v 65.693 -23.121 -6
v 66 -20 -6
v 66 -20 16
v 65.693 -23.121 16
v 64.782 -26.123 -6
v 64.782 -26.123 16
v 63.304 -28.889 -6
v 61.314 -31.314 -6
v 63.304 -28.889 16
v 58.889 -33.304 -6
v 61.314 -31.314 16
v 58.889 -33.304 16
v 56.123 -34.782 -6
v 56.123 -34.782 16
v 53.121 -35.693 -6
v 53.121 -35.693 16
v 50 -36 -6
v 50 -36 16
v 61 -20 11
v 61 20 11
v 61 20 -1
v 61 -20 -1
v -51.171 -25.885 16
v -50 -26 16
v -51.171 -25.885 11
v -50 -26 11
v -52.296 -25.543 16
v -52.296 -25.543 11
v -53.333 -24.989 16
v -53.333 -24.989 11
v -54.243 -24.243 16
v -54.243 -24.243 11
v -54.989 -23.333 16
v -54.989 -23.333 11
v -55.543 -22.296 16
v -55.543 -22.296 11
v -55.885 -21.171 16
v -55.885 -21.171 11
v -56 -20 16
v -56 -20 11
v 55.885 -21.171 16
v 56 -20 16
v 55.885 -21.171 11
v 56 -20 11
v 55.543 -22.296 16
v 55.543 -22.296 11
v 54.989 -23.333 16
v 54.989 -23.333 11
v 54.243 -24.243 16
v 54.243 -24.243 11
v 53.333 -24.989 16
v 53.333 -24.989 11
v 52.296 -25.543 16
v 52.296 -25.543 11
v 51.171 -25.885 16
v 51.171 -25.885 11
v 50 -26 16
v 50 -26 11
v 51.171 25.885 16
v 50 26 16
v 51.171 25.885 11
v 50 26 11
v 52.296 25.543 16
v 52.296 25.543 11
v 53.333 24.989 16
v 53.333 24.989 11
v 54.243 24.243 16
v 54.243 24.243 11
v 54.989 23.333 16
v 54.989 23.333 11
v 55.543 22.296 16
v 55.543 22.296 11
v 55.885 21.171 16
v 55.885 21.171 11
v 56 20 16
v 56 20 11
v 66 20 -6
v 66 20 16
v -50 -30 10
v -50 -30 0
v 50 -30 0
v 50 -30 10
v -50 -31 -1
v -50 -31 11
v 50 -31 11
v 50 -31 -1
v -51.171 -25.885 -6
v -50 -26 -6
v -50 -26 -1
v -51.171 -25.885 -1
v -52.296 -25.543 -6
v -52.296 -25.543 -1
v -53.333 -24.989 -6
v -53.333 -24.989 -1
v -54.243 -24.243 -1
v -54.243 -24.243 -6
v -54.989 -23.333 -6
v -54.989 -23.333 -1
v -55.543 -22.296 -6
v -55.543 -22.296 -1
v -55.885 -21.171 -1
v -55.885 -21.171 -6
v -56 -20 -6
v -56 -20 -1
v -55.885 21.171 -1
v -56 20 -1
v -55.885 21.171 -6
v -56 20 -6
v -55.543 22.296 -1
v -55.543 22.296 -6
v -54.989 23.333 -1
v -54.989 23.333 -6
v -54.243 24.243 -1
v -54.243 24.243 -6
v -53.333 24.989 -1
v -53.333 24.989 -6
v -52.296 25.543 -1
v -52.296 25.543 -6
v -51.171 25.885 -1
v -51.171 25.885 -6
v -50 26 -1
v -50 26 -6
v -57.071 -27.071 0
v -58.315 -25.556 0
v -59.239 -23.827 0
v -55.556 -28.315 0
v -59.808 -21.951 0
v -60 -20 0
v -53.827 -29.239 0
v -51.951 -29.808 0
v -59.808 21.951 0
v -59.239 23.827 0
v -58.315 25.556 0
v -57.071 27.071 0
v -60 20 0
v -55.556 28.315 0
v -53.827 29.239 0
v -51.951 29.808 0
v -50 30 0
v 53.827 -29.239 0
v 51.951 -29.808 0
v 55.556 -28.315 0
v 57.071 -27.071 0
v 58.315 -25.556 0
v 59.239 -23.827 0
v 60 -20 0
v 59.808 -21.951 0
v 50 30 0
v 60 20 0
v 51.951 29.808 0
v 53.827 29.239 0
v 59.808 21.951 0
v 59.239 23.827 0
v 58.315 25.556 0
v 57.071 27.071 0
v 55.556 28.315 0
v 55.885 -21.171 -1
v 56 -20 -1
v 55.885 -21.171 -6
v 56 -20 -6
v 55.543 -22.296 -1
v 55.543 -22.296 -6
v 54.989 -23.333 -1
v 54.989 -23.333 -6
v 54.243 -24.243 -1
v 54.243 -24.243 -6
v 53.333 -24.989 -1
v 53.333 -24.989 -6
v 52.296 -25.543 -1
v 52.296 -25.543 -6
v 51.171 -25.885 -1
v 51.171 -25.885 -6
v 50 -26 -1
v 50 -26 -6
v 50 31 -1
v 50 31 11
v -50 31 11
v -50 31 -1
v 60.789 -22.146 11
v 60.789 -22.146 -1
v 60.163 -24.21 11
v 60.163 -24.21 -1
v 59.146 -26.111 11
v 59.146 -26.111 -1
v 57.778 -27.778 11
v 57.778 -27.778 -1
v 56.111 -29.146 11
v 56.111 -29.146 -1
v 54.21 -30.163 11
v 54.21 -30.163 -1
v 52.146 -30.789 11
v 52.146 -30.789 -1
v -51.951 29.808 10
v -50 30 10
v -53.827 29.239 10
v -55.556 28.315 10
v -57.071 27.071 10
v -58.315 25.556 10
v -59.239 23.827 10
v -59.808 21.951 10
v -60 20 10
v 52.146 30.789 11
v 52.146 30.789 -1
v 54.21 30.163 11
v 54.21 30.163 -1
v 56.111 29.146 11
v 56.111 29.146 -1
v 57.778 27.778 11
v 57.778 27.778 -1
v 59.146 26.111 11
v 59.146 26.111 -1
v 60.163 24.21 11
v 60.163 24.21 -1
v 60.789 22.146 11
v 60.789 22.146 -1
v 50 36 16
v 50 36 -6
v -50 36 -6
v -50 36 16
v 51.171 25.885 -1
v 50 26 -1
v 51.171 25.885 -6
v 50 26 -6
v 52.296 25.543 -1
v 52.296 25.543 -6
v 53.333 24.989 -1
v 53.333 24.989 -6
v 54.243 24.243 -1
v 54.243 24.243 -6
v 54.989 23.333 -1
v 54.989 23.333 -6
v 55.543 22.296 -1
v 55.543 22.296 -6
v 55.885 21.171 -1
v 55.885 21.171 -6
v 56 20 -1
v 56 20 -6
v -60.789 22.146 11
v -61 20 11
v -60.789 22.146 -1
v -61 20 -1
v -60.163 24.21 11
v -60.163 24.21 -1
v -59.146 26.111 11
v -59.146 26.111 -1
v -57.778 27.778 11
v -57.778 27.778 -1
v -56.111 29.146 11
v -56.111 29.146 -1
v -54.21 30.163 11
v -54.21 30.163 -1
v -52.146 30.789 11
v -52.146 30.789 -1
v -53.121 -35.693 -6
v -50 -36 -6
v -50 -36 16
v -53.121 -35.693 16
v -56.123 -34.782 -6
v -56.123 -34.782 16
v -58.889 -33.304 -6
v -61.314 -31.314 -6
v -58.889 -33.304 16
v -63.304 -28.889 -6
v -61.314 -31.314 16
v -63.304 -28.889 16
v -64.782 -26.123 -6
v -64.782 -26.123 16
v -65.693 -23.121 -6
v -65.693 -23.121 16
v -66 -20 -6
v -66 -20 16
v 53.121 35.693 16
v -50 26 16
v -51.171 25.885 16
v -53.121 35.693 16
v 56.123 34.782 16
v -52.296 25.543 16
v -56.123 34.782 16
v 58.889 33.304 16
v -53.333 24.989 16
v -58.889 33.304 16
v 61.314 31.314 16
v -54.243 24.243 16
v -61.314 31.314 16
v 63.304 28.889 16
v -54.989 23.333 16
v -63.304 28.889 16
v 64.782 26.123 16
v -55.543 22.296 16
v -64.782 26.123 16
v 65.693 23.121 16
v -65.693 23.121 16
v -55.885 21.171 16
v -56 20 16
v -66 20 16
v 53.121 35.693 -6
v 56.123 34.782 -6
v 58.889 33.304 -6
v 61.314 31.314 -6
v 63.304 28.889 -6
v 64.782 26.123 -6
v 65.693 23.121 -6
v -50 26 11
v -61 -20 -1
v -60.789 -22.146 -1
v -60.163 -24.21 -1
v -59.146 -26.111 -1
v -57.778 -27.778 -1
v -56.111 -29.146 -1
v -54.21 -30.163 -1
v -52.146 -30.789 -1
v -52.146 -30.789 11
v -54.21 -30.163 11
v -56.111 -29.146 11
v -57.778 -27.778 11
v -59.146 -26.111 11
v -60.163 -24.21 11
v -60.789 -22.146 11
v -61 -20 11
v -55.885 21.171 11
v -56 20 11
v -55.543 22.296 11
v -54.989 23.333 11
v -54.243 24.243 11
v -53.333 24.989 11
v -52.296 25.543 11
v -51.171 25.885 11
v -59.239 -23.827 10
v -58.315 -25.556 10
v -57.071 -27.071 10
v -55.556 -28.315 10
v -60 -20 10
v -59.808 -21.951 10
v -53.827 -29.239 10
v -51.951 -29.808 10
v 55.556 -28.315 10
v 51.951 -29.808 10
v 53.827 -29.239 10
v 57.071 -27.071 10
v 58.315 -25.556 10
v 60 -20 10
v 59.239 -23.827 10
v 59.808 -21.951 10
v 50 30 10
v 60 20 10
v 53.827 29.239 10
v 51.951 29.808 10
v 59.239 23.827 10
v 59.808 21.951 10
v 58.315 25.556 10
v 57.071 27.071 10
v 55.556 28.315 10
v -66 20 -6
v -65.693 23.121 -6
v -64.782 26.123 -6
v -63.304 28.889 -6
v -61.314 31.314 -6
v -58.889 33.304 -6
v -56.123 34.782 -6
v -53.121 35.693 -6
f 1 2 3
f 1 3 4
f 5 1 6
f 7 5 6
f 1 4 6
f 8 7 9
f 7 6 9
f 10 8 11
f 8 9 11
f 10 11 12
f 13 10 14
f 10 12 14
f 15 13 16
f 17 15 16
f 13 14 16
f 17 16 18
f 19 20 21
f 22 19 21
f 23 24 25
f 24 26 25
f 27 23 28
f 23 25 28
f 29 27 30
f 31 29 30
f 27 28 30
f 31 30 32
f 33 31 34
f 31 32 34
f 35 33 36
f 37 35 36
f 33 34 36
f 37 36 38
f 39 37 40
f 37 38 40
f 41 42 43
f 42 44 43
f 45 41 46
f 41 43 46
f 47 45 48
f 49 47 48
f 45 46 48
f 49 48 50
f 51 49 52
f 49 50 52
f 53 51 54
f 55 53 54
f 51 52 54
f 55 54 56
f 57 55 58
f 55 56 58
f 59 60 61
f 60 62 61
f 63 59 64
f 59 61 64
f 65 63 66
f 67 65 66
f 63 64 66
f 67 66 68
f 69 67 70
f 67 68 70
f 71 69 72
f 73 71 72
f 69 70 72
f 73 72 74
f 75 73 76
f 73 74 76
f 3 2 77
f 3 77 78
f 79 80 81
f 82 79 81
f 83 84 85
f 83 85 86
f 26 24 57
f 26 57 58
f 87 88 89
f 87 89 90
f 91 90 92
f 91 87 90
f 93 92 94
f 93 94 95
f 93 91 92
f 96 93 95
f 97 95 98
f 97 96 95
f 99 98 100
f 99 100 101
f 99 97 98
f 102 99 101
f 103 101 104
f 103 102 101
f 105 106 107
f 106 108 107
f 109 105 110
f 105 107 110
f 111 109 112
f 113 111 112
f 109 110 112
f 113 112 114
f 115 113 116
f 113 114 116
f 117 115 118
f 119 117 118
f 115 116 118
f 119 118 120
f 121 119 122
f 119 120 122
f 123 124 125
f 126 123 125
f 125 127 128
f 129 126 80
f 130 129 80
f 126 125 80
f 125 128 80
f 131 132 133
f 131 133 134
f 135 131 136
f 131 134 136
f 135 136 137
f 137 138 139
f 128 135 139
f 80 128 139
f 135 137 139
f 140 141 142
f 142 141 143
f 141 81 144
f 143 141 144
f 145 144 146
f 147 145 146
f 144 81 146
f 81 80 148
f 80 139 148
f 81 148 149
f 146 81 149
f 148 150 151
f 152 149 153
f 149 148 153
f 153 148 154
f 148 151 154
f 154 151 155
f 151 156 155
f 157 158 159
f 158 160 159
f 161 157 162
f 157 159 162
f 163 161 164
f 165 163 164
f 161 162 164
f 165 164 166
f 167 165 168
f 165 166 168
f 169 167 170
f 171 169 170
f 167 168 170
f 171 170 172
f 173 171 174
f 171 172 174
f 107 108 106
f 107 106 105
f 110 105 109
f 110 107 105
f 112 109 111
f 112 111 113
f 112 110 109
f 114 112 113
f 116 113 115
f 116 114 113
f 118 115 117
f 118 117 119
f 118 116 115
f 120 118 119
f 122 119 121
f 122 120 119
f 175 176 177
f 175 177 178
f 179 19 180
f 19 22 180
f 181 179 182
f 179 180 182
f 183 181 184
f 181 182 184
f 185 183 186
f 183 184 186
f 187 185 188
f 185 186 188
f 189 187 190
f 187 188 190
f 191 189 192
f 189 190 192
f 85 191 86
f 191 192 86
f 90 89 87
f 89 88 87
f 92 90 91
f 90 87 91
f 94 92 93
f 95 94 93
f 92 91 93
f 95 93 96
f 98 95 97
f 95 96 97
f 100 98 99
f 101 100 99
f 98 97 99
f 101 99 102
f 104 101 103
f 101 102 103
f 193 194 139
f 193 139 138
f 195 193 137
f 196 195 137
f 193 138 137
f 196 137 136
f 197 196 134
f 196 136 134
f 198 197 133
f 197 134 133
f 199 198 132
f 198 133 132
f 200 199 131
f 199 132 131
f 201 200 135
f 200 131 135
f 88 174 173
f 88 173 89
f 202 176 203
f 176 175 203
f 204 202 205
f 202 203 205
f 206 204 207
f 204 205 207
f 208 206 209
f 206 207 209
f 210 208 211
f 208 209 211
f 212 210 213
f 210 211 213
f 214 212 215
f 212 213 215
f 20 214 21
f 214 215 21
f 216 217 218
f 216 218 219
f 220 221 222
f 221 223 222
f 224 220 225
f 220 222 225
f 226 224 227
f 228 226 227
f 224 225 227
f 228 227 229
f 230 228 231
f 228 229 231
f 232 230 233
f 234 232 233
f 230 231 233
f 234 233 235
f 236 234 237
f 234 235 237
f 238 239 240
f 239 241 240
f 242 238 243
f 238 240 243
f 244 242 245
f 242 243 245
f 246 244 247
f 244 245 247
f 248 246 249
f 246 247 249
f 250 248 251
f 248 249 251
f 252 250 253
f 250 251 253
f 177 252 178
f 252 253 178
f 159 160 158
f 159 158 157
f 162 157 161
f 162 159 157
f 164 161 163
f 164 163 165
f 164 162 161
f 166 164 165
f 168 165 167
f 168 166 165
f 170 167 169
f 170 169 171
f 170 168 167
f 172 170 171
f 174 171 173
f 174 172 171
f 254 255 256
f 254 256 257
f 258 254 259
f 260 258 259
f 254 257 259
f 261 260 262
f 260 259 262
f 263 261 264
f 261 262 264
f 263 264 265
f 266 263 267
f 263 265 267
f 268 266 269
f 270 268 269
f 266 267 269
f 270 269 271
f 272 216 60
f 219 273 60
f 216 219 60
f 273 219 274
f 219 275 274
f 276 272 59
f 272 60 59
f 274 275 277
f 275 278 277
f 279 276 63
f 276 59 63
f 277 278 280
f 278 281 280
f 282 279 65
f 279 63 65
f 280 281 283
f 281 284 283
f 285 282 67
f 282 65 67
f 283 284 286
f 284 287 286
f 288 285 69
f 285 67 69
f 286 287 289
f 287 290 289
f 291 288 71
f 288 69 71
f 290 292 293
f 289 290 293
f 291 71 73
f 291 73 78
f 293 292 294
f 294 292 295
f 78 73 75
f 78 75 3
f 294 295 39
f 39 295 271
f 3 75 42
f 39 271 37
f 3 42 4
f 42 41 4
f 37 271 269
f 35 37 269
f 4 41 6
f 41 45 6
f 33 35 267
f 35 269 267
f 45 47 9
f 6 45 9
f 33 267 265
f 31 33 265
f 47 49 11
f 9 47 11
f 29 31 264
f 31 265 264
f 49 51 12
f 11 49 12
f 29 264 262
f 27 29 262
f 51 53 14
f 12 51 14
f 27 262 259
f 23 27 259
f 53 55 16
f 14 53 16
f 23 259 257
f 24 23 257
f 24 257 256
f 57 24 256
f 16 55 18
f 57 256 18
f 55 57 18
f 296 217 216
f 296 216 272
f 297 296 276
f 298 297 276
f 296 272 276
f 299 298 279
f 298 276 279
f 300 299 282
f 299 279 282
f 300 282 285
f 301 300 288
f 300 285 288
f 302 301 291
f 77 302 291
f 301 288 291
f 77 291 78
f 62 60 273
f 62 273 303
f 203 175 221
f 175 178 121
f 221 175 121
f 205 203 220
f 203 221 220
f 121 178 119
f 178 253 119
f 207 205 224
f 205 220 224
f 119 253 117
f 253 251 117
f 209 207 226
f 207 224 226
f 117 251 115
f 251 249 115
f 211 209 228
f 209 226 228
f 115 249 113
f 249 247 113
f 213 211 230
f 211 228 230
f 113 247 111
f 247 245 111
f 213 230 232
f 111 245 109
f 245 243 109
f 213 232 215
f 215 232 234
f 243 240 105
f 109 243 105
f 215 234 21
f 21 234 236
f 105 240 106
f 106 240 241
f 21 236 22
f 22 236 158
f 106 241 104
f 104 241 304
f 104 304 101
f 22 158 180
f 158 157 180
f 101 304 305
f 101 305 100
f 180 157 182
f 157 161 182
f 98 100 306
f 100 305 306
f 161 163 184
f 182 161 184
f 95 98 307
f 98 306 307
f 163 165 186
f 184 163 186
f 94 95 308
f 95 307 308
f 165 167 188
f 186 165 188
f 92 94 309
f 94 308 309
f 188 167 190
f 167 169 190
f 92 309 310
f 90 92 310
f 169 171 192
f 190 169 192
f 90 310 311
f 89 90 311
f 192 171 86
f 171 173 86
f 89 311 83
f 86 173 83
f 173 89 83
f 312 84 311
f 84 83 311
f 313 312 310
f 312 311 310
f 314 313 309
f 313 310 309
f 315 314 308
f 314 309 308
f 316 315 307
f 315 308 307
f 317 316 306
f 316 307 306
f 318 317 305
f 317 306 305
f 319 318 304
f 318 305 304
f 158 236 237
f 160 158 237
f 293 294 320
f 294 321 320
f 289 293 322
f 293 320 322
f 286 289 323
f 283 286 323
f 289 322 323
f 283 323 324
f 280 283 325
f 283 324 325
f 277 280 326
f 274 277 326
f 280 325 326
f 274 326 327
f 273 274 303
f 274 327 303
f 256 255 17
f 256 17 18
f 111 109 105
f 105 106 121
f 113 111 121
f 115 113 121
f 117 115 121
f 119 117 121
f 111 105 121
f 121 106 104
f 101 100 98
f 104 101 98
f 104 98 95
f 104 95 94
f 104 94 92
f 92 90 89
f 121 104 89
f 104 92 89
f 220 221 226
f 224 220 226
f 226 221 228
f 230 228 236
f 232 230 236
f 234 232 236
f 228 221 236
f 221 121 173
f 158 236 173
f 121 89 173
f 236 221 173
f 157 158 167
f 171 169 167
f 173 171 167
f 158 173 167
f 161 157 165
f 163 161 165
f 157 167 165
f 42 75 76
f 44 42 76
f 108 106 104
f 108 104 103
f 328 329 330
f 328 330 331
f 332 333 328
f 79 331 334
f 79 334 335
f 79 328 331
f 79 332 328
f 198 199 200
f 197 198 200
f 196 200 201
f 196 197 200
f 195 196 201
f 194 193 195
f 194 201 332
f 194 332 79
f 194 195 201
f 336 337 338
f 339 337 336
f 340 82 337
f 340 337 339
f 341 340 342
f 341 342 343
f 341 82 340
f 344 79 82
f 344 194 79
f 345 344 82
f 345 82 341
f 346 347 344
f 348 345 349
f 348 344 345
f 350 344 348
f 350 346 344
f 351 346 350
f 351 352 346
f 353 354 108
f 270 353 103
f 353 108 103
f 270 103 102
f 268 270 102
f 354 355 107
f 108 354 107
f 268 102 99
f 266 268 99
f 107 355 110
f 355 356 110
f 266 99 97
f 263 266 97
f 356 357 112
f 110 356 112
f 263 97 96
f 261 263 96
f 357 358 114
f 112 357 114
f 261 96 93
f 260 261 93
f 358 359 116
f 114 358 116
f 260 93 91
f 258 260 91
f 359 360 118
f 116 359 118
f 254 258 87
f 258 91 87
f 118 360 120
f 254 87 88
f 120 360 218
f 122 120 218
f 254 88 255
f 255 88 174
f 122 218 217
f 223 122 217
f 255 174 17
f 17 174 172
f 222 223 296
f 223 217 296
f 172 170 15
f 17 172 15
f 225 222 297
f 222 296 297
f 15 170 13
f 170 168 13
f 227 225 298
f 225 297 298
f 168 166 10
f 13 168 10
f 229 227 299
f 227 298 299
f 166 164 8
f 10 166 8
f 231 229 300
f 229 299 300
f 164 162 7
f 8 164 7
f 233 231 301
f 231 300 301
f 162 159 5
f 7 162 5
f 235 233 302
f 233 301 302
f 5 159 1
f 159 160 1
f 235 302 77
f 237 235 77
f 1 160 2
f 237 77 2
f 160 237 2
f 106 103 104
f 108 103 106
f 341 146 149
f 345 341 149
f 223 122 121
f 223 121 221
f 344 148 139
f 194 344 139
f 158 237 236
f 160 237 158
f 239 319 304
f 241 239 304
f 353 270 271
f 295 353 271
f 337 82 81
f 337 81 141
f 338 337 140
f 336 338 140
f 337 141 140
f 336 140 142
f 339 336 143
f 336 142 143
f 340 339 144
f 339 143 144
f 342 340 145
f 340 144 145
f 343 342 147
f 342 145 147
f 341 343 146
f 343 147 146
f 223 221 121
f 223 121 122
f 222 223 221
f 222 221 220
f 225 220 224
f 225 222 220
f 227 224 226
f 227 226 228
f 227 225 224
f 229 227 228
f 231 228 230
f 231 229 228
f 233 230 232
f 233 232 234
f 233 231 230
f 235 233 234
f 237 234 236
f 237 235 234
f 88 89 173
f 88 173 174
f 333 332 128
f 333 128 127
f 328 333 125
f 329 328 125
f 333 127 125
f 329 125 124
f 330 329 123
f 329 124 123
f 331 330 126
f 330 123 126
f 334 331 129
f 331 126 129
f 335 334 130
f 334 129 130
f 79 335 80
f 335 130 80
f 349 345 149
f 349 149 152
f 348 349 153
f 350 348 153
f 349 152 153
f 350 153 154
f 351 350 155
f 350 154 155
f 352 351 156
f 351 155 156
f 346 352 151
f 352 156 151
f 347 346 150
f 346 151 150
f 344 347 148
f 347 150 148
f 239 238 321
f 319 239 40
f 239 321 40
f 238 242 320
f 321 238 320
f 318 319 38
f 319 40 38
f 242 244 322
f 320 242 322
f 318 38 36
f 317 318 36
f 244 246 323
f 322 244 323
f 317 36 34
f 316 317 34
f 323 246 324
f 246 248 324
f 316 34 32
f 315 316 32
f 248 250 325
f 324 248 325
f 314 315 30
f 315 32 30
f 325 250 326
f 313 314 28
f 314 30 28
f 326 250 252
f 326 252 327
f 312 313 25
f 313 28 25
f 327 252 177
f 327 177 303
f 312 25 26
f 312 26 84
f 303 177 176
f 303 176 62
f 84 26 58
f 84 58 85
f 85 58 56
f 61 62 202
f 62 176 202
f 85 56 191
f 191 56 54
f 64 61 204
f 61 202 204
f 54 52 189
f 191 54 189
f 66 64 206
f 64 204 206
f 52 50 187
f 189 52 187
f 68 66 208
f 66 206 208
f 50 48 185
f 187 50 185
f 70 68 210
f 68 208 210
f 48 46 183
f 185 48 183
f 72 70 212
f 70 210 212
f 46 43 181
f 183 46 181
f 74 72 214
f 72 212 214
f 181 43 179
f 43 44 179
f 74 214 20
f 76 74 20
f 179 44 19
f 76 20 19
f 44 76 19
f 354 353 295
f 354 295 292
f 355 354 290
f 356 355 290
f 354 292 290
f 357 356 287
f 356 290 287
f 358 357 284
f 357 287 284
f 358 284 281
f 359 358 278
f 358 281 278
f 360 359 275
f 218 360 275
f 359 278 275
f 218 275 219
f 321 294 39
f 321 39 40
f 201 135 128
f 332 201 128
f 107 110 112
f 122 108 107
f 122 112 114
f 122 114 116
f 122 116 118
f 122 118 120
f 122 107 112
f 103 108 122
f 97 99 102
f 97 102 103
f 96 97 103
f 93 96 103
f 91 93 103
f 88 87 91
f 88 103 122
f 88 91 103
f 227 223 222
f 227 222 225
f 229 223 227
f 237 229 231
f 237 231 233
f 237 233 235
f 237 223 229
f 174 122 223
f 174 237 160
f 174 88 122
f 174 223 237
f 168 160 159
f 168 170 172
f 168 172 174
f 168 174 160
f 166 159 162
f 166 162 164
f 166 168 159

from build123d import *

# Parameters (mm, degrees)
F3_DEPTH = 10
F7_DEPTH = 5


with BuildPart() as f3:
    # F2 (on Top) → F3 (new body)
    with BuildSketch(Plane.XY):
        with BuildLine():
            Line((50, 30), (-50, 30))
            ThreePointArc((-50, 30), (-57.0710678119, 27.0710678119), (-60, 20))
            Line((-60, 20), (-60, -20))
            ThreePointArc((-60, -20), (-57.0710678119, -27.0710678119), (-50, -30))
            Line((-50, -30), (50, -30))
            ThreePointArc((50, -30), (57.0710678119, -27.0710678119), (60, -20))
            Line((60, -20), (60, 20))
            ThreePointArc((60, 20), (57.0710678119, 27.0710678119), (50, 30))
        make_face()
    extrude(amount=F3_DEPTH)


with BuildPart() as f5:
    # F5: sweep along a path in F2
    with BuildLine(Plane.XY) as f5_path:
        Line((0, 31), (50, 31))
        ThreePointArc((50, 31), (57.7781745931, 27.7781745931), (61, 20))
        Line((61, 20), (61, -20))
        ThreePointArc((61, -20), (57.7781745931, -27.7781745931), (50, -31))
        Line((50, -31), (-50, -31))
        ThreePointArc((-50, -31), (-57.7781745931, -27.7781745931), (-61, -20))
        Line((-61, -20), (-61, 20))
        ThreePointArc((-61, 20), (-57.7781745931, 27.7781745931), (-50, 31))
        Line((-50, 31), (0, 31))
    # F4 (on Right) → F5 (sweep)
    with BuildSketch(Plane.YZ):
        Polygon((31, 11), (31, -1), (26, -1), (26, -6), (31, -6), (36, -6), (36, 16), (26, 16), (26, 11), align=None)
    sweep(path=f5_path.line)


with BuildPart() as f7:
    # F6 (on face) → F7 (new body)
    with BuildSketch(Plane(origin=(0, 0, -6), x_dir=(1, 0, 0), z_dir=(0, 0, -1))):
        with BuildLine():
            Line((-56, 20), (-56, -20))
            ThreePointArc((-56, -20), (-54.2426406871, -24.2426406871), (-50, -26))
            Line((-50, -26), (50, -26))
            ThreePointArc((50, -26), (54.2426406871, -24.2426406871), (56, -20))
            Line((56, -20), (56, 20))
            ThreePointArc((56, 20), (54.2426406871, 24.2426406871), (50, 26))
            Line((50, 26), (-50, 26))
            ThreePointArc((-50, 26), (-54.2426406871, 24.2426406871), (-56, 20))
        make_face()
    extrude(amount=-F7_DEPTH)


solid = Compound([f3.part, f5.part, f7.part])
